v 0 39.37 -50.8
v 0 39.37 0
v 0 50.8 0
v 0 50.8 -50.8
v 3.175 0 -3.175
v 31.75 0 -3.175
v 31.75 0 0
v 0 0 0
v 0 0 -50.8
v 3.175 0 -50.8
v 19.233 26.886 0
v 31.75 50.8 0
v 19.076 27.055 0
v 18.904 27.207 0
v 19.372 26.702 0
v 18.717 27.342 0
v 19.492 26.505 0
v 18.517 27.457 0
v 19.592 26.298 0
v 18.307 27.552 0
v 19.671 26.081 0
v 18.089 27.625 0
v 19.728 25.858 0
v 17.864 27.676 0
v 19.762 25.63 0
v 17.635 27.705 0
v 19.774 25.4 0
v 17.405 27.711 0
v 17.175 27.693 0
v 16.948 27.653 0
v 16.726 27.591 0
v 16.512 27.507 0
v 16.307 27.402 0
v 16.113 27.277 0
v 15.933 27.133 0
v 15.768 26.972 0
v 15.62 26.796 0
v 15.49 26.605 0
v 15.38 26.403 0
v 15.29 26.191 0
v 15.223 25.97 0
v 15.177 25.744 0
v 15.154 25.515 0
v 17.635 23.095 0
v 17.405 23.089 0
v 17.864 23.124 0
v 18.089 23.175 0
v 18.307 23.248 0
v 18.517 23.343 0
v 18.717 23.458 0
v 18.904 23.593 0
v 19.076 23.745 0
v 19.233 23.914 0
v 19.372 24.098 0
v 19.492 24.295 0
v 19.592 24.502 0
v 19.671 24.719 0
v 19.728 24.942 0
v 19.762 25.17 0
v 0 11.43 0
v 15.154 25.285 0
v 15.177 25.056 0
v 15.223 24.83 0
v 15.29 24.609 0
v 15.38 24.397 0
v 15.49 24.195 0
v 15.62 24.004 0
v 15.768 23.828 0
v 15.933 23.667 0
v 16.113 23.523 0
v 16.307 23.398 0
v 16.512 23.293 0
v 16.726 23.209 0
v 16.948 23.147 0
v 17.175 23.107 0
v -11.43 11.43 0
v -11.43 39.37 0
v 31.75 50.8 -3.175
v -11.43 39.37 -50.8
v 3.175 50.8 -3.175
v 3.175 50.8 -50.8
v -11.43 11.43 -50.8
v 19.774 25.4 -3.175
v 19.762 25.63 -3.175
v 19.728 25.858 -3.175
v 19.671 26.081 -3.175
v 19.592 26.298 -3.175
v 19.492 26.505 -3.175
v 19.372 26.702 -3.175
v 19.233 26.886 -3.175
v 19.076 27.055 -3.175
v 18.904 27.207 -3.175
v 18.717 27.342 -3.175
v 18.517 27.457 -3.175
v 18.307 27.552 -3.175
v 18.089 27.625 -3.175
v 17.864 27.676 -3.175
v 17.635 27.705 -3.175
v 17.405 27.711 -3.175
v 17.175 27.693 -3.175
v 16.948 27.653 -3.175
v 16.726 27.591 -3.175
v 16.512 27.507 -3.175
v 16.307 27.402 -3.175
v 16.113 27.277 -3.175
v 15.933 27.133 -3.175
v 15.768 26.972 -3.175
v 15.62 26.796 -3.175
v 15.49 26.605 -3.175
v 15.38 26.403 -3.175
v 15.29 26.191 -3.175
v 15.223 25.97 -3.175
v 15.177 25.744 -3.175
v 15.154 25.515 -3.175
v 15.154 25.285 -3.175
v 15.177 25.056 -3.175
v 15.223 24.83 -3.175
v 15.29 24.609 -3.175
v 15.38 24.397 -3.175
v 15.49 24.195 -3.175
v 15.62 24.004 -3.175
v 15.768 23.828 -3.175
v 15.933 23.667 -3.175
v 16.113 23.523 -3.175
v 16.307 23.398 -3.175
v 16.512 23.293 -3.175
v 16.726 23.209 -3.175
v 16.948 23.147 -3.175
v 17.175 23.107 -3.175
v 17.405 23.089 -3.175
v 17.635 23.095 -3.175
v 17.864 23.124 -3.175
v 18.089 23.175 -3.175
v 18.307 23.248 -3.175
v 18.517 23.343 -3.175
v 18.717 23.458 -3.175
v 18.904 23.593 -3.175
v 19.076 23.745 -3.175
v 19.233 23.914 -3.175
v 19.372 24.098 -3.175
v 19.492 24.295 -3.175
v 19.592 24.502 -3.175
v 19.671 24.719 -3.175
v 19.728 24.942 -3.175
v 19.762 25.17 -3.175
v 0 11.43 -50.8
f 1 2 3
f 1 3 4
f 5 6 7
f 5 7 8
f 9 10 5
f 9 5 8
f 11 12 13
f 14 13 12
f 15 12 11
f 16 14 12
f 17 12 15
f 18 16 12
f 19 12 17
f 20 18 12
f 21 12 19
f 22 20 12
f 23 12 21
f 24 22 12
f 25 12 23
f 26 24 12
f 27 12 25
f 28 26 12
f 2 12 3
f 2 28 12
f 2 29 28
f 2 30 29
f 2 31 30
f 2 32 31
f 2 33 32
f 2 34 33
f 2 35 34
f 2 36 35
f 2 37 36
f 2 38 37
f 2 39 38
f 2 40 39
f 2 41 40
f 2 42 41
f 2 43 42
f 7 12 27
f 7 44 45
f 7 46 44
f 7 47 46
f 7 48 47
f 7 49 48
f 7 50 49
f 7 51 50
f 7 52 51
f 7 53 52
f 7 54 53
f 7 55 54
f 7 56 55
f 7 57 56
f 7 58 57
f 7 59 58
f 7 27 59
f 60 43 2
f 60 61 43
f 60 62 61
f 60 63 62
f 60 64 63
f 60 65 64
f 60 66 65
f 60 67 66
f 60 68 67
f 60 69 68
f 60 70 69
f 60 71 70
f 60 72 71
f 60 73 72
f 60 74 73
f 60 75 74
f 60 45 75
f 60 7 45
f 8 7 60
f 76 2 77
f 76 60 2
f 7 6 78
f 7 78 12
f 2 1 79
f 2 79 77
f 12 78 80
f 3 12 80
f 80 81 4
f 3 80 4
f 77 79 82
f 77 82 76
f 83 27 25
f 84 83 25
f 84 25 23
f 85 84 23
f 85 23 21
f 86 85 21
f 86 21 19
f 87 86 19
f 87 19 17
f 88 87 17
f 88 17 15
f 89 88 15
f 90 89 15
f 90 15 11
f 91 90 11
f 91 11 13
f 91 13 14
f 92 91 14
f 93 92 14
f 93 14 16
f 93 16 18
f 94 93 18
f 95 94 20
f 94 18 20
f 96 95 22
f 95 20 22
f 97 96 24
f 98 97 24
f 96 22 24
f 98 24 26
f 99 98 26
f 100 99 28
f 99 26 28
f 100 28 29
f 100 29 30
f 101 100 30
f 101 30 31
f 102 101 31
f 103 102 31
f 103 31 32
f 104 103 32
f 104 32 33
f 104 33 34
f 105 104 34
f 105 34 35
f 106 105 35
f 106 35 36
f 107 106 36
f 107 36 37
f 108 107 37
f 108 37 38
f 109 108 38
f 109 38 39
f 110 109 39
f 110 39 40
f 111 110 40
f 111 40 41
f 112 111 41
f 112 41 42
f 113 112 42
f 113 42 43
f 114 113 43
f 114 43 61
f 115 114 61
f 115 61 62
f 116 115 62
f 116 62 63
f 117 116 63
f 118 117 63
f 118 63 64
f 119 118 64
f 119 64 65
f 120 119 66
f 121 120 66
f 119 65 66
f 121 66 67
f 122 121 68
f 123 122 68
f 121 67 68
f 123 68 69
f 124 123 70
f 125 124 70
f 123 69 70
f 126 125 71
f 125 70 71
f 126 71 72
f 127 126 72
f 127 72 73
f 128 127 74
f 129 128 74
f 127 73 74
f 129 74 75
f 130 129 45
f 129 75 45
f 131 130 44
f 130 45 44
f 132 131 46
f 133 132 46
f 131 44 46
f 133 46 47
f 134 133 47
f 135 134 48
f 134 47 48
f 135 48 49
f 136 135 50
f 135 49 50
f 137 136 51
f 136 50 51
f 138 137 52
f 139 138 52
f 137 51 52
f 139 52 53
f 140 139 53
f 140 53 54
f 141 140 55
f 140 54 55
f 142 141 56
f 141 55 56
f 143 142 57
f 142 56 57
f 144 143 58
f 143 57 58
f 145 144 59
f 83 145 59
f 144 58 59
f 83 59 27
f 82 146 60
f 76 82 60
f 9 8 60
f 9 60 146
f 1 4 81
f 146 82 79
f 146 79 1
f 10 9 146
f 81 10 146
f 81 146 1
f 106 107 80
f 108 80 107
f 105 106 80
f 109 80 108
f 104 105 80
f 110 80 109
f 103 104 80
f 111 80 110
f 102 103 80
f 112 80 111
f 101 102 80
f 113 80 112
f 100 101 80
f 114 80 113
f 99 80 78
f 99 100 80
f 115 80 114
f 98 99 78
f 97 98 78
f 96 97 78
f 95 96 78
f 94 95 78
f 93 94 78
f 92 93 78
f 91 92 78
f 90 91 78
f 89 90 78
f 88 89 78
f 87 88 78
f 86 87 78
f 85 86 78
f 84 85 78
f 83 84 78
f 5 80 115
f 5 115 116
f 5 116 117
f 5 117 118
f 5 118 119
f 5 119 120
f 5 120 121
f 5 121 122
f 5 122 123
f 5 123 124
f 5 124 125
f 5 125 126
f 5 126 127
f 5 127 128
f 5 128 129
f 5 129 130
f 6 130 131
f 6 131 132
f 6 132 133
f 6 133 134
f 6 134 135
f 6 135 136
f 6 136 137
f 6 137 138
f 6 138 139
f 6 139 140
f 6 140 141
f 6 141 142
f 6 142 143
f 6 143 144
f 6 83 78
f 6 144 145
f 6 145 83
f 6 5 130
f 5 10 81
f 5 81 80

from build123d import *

# Parameters (mm, degrees)
BOSS_EXTRUDE1_DEPTH    = 50.8
F_12_28_TAPPED_HOLE1_D = 4.6228
SKETCH6_W              = 50.8
SKETCH6_H              = 27.94
BOSS_EXTRUDE2_DEPTH    = 11.43


with BuildPart() as part:
    # Sketch2 → Boss-Extrude1 (new body)
    with BuildSketch(Plane(origin=(0, 0, 0), x_dir=(1, 0, 0), z_dir=(0, 1, 0))):
        Polygon((0, 0), (0, 50.8), (3.175, 50.8), (3.175, 3.175), (31.75, 3.175), (31.75, 0), align=None)
    extrude(amount=BOSS_EXTRUDE1_DEPTH)

    # #12-28 Tapped Hole1 (through all)
    with Locations(Plane(origin=(0, 0, -3.175), x_dir=(-1, 0, 0), z_dir=(0, 0, -1))):
        with Locations((-17.4625, 25.4)):
            Hole(F_12_28_TAPPED_HOLE1_D / 2)

    # Sketch6 → Boss-Extrude2 (add)
    with BuildSketch(Plane.ZY):
        with Locations((-25.4, 25.4)):
            Rectangle(SKETCH6_W, SKETCH6_H)
    extrude(amount=BOSS_EXTRUDE2_DEPTH)


solid = part.part
